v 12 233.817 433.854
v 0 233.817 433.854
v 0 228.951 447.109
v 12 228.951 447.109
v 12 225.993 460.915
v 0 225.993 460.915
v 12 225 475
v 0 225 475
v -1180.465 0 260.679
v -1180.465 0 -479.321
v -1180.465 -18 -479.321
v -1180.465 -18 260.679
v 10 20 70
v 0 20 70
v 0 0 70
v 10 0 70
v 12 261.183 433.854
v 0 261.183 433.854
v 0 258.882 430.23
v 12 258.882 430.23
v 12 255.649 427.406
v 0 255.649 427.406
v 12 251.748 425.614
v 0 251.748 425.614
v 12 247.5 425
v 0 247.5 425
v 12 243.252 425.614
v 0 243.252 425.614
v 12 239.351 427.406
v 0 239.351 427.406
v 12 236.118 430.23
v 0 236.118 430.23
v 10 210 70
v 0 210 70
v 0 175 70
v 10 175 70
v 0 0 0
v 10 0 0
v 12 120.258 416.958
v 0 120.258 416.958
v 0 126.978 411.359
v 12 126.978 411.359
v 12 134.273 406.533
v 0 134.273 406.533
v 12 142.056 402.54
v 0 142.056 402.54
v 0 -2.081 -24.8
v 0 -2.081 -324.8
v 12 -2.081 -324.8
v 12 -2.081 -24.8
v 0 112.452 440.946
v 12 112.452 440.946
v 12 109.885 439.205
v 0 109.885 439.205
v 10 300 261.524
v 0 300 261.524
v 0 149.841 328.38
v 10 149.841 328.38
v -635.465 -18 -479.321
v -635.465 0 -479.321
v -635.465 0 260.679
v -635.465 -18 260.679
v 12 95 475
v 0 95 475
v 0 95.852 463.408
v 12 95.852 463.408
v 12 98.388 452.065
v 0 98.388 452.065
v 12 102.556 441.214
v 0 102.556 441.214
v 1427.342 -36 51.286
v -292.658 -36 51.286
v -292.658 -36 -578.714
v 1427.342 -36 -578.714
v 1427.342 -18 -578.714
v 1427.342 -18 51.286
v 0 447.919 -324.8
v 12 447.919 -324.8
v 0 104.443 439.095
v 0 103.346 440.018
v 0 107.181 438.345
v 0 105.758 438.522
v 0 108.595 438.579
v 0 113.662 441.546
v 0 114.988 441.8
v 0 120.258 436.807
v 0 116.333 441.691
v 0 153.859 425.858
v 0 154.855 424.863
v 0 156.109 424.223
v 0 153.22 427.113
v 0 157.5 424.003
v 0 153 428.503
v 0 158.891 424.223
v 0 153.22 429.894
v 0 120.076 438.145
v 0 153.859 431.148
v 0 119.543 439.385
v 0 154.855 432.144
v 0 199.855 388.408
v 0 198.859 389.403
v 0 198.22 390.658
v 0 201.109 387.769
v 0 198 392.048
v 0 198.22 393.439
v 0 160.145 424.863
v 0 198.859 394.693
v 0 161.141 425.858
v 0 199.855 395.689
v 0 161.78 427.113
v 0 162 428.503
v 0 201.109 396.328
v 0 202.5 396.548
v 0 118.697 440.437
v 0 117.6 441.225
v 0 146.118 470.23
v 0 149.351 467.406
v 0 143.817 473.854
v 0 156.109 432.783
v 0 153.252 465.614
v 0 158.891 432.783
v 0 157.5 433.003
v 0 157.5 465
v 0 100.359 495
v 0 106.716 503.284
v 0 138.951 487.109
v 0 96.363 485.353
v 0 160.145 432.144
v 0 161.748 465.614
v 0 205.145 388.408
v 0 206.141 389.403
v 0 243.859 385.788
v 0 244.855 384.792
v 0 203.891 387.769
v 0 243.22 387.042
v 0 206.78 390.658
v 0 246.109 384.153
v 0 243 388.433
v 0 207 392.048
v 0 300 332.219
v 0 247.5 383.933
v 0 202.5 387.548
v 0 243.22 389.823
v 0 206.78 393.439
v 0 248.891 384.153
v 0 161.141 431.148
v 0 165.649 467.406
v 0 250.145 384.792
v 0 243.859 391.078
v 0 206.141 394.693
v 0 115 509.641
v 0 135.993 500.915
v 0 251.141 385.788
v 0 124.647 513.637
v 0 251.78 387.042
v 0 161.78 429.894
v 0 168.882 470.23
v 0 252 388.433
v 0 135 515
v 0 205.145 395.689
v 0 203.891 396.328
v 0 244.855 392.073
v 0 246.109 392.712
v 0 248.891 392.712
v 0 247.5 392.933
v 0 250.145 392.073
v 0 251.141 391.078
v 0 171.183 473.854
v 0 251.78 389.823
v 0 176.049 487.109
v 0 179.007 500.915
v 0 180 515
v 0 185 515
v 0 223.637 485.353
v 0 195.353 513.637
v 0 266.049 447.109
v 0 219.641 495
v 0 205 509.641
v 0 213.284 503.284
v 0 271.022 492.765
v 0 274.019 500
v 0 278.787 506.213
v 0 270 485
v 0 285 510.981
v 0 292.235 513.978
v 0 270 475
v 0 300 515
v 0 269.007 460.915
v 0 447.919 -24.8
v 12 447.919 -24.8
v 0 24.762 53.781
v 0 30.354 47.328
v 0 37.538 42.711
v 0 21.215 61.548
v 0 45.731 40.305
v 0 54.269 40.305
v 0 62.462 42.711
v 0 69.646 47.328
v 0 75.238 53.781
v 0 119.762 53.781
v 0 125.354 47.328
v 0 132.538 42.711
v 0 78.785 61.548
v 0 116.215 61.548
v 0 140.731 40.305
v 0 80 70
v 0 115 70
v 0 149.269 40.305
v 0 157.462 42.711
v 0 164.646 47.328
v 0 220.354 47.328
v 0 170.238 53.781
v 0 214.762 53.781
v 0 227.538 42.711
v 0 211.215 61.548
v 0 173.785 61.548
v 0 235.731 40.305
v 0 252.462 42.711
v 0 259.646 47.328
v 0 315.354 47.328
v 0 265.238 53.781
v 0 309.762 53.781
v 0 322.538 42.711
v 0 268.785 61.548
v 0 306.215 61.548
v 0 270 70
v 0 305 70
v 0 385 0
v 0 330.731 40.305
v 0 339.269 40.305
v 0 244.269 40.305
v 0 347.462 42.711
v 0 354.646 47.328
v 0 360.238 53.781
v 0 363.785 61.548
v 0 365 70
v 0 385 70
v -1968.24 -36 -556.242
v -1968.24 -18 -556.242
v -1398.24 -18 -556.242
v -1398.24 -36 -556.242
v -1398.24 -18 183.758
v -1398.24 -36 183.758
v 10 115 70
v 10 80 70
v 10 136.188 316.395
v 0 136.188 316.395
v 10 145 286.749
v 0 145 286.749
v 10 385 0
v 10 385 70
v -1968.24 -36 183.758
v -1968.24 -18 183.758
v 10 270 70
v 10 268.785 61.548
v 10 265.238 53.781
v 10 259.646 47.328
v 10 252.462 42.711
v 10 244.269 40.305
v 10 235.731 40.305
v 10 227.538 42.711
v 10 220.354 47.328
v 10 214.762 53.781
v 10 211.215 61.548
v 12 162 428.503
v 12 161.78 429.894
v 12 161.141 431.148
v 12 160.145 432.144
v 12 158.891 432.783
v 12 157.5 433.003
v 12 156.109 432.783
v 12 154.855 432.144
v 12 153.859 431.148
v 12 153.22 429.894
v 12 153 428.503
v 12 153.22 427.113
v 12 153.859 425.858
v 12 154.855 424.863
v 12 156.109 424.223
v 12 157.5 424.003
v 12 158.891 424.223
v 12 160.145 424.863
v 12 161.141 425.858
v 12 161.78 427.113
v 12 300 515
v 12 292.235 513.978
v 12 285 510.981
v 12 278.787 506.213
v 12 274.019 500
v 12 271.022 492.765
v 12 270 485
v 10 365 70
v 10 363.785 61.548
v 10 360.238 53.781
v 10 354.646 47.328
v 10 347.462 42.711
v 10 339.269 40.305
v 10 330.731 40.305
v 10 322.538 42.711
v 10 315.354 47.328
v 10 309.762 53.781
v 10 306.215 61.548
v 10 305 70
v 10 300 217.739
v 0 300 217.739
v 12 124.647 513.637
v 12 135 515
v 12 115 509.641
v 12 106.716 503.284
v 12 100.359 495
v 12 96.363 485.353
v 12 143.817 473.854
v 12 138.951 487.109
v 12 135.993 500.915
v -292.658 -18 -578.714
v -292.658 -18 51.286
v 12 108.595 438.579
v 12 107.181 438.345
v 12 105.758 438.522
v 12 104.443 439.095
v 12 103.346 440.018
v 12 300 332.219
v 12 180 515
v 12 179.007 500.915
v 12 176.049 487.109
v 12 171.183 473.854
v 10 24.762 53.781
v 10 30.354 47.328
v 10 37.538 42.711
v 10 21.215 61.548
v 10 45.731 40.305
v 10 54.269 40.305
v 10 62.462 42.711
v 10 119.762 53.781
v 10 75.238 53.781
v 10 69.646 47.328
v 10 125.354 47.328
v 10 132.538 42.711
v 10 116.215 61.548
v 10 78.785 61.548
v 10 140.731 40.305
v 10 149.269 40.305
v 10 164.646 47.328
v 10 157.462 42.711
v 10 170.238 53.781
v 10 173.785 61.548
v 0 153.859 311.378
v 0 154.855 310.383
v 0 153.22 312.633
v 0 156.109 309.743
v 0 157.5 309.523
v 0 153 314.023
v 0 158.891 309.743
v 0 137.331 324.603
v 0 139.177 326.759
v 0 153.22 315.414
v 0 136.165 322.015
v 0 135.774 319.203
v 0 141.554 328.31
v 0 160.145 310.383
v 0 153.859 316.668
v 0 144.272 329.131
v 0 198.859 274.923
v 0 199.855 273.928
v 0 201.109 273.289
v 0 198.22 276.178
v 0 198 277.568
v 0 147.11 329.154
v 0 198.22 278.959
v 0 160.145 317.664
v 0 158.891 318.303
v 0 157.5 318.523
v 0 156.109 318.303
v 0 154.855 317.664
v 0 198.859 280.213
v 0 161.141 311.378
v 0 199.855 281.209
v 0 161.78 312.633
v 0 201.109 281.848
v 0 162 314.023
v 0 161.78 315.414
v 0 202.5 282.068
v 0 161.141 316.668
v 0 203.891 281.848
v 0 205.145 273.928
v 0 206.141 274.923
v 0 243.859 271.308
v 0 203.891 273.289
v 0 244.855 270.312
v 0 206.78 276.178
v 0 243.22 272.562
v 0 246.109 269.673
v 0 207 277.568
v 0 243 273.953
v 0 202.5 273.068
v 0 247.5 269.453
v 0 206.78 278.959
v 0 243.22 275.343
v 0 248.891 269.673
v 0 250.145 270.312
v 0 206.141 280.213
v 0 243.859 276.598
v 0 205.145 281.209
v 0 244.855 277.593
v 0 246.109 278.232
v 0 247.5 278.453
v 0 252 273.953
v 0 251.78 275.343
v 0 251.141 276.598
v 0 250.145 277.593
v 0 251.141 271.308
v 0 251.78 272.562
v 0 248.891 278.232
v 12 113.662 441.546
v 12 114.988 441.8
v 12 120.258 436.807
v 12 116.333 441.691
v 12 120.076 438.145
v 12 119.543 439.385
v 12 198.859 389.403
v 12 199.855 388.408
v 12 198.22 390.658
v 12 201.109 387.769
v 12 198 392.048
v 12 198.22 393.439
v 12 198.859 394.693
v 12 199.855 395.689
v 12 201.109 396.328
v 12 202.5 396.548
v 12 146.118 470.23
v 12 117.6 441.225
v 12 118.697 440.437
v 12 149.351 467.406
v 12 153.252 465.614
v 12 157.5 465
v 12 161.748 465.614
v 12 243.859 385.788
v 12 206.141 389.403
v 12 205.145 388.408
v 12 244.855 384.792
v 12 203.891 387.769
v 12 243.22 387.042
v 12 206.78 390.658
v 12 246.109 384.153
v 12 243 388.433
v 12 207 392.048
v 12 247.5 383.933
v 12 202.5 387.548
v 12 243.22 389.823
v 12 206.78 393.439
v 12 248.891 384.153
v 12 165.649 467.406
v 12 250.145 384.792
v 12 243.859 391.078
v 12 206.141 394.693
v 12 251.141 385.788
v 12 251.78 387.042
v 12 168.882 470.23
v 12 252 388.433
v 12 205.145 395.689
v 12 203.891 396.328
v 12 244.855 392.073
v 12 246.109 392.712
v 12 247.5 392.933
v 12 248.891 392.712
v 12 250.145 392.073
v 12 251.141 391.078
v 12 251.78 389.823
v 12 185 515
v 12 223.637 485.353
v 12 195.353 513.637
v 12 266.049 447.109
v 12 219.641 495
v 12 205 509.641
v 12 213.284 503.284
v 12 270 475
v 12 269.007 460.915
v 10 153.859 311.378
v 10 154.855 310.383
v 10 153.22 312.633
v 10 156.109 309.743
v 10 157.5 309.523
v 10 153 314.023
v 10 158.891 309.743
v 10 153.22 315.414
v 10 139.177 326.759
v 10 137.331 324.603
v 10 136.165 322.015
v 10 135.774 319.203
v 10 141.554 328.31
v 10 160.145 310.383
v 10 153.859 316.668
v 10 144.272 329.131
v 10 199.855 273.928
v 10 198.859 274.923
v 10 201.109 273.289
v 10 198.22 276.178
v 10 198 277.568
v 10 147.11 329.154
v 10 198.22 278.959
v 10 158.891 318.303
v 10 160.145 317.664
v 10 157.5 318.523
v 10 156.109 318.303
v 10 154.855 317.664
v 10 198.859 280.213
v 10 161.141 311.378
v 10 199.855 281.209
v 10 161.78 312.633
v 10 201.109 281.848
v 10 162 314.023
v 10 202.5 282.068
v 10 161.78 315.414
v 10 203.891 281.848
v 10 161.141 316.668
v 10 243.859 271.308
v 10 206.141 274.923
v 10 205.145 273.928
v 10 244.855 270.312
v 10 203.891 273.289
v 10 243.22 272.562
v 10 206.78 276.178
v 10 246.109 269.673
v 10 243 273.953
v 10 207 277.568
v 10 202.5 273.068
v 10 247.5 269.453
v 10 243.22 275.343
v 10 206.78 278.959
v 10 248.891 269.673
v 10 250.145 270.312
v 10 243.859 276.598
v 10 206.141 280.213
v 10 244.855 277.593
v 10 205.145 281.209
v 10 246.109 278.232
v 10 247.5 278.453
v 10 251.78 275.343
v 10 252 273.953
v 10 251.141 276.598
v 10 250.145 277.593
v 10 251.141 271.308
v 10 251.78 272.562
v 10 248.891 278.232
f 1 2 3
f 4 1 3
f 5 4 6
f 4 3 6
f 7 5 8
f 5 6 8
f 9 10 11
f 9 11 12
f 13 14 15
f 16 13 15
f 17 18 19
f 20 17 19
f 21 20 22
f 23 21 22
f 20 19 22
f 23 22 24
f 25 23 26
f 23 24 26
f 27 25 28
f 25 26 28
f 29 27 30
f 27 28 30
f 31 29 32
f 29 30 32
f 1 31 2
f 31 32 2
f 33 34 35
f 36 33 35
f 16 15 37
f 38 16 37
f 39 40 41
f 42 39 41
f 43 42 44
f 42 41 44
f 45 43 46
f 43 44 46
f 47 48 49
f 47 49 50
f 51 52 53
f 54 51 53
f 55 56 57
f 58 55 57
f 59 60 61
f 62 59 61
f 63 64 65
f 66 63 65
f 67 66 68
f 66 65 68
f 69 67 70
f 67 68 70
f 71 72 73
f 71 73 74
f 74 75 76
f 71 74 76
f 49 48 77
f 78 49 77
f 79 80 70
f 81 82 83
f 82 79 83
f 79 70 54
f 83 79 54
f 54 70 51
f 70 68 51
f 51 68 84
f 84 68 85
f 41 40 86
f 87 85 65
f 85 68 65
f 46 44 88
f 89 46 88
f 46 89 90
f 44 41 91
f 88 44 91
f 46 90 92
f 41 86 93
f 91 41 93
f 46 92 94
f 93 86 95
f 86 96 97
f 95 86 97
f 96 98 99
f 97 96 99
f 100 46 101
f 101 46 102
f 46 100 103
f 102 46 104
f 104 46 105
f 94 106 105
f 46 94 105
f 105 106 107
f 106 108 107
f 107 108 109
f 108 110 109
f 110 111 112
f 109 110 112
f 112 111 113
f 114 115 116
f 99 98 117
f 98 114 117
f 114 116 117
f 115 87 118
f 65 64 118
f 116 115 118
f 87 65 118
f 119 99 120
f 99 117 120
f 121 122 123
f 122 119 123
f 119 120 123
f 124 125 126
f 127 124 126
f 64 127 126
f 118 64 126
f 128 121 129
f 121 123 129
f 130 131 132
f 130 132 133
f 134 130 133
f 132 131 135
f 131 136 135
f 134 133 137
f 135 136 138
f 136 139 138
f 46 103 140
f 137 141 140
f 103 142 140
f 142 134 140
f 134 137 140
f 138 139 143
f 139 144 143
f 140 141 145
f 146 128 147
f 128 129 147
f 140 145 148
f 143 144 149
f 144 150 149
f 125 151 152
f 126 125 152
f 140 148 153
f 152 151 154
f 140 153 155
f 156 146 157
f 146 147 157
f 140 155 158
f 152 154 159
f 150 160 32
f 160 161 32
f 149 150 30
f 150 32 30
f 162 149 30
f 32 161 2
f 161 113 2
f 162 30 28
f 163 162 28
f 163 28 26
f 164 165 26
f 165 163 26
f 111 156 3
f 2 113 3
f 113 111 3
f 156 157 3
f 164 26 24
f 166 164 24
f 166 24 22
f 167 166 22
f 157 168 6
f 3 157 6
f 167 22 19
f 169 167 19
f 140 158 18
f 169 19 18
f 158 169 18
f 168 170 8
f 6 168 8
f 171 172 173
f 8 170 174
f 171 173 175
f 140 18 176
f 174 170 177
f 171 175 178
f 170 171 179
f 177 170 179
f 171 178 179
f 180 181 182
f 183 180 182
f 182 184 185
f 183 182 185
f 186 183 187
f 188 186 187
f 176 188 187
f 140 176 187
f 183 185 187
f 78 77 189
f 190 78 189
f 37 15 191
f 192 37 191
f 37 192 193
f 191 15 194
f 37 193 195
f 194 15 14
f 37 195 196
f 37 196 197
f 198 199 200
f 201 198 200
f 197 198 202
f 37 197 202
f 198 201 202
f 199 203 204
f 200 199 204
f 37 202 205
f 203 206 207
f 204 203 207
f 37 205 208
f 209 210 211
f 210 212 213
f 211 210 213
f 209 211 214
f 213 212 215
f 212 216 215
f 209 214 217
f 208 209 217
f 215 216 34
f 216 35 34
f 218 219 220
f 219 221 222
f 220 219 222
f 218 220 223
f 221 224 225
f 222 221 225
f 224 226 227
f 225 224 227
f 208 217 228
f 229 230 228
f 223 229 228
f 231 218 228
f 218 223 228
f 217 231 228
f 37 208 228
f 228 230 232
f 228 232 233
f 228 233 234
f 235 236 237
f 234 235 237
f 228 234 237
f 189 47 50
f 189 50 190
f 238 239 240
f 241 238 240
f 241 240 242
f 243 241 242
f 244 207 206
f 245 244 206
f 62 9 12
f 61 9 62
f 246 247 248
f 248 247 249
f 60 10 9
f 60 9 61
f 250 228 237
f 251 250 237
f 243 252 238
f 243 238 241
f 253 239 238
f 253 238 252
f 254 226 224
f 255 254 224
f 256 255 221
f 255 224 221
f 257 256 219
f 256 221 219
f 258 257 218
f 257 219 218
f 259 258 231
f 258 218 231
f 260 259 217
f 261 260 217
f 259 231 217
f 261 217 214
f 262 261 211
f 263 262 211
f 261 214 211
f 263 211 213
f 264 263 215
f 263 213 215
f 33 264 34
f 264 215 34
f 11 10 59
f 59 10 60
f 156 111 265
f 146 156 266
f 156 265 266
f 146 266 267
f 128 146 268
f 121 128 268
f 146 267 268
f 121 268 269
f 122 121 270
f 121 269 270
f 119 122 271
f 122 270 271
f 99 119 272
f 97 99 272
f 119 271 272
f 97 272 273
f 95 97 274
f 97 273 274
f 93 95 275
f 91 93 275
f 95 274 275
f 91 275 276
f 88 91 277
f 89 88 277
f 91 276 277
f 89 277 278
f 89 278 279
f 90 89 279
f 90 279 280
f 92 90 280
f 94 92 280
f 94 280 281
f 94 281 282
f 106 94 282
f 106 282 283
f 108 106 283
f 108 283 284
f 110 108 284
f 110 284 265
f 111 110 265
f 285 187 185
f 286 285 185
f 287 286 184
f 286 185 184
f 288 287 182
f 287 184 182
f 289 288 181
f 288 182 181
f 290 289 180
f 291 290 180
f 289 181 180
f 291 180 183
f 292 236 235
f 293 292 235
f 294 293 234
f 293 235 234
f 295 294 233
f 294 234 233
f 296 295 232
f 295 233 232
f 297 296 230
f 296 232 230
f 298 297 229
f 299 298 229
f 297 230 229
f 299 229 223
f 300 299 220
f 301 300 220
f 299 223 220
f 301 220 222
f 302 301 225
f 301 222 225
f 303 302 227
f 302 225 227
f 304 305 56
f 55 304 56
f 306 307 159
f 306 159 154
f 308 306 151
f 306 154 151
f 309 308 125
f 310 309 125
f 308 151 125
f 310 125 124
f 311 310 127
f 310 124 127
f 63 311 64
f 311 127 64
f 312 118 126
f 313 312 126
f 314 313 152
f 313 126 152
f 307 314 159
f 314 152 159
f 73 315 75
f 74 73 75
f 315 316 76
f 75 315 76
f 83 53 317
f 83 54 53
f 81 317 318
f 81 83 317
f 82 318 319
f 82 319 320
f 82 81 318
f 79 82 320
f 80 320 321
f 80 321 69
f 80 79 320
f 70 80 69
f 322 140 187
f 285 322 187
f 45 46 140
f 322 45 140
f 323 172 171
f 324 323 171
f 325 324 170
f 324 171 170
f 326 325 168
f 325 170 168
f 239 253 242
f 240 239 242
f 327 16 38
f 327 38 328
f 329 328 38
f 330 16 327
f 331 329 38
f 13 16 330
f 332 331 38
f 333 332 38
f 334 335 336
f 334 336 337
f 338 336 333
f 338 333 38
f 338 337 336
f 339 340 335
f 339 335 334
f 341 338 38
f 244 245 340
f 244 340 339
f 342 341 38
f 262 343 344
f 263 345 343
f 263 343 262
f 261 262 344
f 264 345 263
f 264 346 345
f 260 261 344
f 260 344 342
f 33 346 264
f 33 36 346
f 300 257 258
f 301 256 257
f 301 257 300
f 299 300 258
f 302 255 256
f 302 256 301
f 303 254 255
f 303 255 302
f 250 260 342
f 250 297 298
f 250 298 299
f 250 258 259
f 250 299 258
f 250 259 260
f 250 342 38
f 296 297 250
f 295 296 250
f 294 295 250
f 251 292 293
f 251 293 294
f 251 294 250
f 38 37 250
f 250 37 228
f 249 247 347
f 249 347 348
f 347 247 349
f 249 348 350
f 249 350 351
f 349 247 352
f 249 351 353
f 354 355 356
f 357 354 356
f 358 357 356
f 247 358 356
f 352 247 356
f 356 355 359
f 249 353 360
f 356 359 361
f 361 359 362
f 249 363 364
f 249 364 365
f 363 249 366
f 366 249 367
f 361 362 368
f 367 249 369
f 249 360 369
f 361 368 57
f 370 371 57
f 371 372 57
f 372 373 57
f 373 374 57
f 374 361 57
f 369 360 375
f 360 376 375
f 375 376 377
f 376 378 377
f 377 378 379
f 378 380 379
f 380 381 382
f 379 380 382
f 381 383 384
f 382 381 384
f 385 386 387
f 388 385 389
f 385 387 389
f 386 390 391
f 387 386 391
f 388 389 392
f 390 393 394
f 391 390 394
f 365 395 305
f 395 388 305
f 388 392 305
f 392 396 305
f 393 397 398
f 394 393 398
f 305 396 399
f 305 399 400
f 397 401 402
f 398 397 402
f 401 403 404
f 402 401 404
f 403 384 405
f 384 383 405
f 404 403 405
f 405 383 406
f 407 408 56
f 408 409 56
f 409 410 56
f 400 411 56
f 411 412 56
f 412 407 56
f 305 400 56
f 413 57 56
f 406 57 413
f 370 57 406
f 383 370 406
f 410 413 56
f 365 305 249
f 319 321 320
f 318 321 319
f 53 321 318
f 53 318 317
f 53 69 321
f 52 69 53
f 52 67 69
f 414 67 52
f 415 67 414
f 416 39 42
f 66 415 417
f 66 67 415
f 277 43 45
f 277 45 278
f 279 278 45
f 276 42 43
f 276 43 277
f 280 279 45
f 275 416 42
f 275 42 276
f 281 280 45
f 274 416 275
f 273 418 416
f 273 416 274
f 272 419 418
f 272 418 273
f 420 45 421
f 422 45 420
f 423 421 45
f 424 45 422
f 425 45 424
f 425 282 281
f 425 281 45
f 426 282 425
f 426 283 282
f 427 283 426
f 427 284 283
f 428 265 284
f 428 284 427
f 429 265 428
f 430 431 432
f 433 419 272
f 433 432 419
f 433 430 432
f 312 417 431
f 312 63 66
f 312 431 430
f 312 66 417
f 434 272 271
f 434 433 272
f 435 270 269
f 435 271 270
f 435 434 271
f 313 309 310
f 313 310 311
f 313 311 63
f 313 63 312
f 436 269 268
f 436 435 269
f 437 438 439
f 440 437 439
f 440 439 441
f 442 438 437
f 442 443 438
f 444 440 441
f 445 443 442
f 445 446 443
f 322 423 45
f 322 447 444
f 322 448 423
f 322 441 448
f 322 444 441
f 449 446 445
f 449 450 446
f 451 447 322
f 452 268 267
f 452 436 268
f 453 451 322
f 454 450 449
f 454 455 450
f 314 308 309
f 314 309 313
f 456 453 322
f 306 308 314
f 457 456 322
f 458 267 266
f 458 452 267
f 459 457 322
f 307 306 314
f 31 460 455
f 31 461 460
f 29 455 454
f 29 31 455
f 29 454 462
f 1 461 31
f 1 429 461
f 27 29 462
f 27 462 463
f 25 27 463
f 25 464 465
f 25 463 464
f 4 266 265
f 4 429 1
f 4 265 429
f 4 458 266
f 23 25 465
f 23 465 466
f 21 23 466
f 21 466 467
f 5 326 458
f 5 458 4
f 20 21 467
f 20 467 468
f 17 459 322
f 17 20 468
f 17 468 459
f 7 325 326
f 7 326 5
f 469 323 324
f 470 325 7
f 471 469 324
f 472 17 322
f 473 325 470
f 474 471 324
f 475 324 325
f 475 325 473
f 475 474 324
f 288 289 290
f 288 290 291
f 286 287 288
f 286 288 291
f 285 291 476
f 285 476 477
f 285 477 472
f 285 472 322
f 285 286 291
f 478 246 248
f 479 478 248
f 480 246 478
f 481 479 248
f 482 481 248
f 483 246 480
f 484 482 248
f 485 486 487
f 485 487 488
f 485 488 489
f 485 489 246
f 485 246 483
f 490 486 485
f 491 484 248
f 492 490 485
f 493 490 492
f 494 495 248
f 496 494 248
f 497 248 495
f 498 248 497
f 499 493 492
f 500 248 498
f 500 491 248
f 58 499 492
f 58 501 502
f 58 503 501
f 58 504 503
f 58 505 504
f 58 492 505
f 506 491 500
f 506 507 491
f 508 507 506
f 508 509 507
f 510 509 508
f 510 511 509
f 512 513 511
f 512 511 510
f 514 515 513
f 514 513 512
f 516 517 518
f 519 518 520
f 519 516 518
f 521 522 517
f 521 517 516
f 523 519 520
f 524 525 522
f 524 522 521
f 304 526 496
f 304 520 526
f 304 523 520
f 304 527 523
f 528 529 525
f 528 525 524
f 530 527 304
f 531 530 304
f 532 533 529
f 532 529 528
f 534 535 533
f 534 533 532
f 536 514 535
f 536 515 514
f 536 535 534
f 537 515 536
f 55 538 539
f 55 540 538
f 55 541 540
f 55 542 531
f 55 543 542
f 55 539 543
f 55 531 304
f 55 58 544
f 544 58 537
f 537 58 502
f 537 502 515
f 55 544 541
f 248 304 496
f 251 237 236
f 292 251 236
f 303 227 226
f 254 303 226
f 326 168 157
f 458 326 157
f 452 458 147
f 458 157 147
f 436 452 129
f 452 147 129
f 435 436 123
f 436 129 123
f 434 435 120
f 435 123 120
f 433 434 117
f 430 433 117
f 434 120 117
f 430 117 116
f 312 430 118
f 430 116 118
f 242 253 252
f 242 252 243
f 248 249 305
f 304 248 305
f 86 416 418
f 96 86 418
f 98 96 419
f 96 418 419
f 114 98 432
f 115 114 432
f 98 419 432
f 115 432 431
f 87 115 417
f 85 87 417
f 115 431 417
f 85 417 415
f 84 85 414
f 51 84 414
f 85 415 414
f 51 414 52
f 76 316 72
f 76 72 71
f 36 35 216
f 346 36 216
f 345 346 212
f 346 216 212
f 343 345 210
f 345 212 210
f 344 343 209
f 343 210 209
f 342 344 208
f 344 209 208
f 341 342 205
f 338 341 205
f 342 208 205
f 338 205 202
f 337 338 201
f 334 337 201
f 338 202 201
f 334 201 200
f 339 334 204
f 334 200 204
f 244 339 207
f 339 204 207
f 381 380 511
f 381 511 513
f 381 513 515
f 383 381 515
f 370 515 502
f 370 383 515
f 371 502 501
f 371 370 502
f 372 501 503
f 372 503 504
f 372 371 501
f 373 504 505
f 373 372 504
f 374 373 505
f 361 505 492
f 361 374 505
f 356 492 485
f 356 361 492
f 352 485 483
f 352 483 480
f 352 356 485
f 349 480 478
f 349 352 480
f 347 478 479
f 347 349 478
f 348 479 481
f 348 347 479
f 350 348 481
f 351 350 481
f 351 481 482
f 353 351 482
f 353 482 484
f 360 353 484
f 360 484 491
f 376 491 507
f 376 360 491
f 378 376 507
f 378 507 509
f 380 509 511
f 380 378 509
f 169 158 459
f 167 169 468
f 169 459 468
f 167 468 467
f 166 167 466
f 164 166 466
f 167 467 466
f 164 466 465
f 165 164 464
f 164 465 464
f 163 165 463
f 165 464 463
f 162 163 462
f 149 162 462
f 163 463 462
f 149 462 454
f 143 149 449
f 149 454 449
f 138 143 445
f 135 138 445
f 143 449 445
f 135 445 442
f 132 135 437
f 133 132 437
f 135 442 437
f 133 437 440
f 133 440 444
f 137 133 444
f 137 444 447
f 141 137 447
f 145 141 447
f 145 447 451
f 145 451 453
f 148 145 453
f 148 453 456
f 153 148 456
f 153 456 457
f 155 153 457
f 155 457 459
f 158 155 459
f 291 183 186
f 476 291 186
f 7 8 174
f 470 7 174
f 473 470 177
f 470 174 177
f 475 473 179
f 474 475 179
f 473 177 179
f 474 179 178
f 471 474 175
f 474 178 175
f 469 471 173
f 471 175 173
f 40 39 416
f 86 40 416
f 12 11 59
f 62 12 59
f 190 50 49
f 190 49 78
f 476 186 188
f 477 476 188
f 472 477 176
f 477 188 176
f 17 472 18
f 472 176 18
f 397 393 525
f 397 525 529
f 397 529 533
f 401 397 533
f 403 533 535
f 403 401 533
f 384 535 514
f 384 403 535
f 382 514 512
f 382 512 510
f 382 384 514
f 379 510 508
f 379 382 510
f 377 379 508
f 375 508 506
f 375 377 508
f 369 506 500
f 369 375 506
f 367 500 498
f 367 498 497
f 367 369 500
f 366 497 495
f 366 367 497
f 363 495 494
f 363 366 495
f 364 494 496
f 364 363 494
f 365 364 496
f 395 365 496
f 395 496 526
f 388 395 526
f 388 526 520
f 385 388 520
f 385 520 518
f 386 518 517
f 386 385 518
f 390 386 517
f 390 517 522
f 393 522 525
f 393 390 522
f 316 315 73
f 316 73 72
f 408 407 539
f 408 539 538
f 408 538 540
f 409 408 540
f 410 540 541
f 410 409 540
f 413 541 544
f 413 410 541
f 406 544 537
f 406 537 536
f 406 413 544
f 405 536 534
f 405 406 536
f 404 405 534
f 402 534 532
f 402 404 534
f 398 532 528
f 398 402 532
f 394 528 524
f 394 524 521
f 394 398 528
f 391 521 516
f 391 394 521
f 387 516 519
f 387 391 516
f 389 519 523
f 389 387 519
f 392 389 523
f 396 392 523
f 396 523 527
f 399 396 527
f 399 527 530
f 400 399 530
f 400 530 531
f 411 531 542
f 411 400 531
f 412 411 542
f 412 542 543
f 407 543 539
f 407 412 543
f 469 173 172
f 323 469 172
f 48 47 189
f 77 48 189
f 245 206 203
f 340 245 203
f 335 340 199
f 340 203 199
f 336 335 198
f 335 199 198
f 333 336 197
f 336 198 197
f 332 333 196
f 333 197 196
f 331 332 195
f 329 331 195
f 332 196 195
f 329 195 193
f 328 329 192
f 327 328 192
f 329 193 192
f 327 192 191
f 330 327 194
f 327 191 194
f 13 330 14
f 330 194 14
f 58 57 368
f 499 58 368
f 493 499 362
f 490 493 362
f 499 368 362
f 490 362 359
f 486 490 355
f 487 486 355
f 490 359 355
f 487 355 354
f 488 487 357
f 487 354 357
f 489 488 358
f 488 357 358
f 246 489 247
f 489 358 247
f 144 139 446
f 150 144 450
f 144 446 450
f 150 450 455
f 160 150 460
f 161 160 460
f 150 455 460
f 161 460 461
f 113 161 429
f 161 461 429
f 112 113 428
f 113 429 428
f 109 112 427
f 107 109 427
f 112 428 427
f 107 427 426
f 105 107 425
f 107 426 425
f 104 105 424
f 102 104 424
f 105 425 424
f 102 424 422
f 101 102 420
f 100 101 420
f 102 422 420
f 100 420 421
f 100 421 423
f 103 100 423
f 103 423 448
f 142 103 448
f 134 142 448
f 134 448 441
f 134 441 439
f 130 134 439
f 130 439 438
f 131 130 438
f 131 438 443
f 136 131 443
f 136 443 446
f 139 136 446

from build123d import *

# Parameters (mm, degrees)
F1_DEPTH  = 10
F3_DEPTH  = 12
F4_R      = 4.5
F5_DEPTH  = 10
F6_R      = 4.5
F7_DEPTH  = 12.001
F8_W      = 545
F8_H      = 740
F9_DEPTH  = 18
F10_W     = 570
F10_H     = 740
F11_DEPTH = 18
F12_W     = 1720
F12_H     = 630
F13_DEPTH = 18
F14_W     = 450
F14_H     = 300
F15_DEPTH = 12
F17_DEPTH = 25
F18_R     = 5


with BuildPart() as f1:
    # F0 (on Right) → F1 (new body)
    with BuildSketch(Plane.YZ):
        with BuildLine():
            Line((0, 70), (0, 0))
            Line((0, 0), (385, 0))
            Line((385, 0), (385, 70))
            Line((385, 70), (365, 70))
            ThreePointArc((365, 70), (335, 40), (305, 70))
            Line((305, 70), (270, 70))
            ThreePointArc((270, 70), (240, 40), (210, 70))
            Line((210, 70), (175, 70))
            ThreePointArc((175, 70), (145, 40), (115, 70))
            Line((115, 70), (80, 70))
            ThreePointArc((80, 70), (50, 40), (20, 70))
            Line((20, 70), (0, 70))
        make_face()
    extrude(amount=F1_DEPTH)


with BuildPart() as f3:
    # F2 (on Right) → F3 (new body)
    with BuildSketch(Plane.YZ):
        with BuildLine():
            ThreePointArc((261.1829268293, 433.8536585366), (247.5, 425), (233.8170731707, 433.8536585366))
            ThreePointArc((233.8170731707, 433.8536585366), (227.2290075864, 453.9597873399), (225, 475))
            ThreePointArc((225, 475), (213.2842712475, 503.2842712475), (185, 515))
            Line((185, 515), (180, 515))
            ThreePointArc((180, 515), (177.7709924136, 493.9597873399), (171.1829268293, 473.8536585366))
            ThreePointArc((171.1829268293, 473.8536585366), (157.5, 465), (143.8170731707, 473.8536585366))
            ThreePointArc((143.8170731707, 473.8536585366), (137.2290075864, 493.9597873399), (135, 515))
            ThreePointArc((135, 515), (106.7157287525, 503.2842712475), (95, 475))
            ThreePointArc((95, 475), (107.7961867785, 431.8007974109), (142.0559440231, 402.5402004596))
            Line((142.0559440231, 402.5402004596), (300, 332.2189760647))
            Line((300, 332.2189760647), (300, 515))
            ThreePointArc((300, 515), (278.7867965644, 506.2132034356), (270, 485))
            Line((270, 485), (270, 475))
            ThreePointArc((270, 475), (267.7709924136, 453.9597873399), (261.1829268293, 433.8536585366))
        make_face()
    extrude(amount=F3_DEPTH)

    # F6 (on face) → F7 (cut, through all)
    with BuildSketch(Plane.YZ.offset(12)):
        with Locations((157.5, 428.5031508404)):
            Circle(F6_R)
        with Locations((202.5, 392.0483158239)):
            Circle(F6_R)
        with Locations((247.5, 388.4325691626)):
            Circle(F6_R)
    extrude(amount=-F7_DEPTH, mode=Mode.SUBTRACT)

    # F16 (on face) → F17 (cut)
    with BuildSketch(Plane.YZ.offset(12)):
        with BuildLine():
            Line((90.5504003167, 426.0971546173), (120.258204639, 406.9633185863))
            Line((120.258204639, 406.9633185863), (120.258204639, 416.9582954822))
            ThreePointArc((120.258204639, 416.9582954822), (112.0061980519, 425.9229716498), (105.2246160535, 436.0457764538))
            Line((105.2246160535, 436.0457764538), (90.5504003167, 426.0971546173))
        make_face()
        with BuildLine():
            ThreePointArc((105.2246160535, 436.0457764538), (112.0061980519, 425.9229716498), (120.258204639, 416.9582954822))
            Line((120.258204639, 416.9582954822), (120.258204639, 436.8074358551))
            ThreePointArc((120.258204639, 436.8074358551), (117.6003234915, 441.2249554398), (112.4524129268, 440.9459782154))
            Line((112.4524129268, 440.9459782154), (105.2246160535, 436.0457764538))
        make_face()
    extrude(amount=-F17_DEPTH, mode=Mode.SUBTRACT)

    # F18
    f18_edges = [f3.edges().sort_by_distance(p)[0] for p in [
        (6, 105.224616, 436.045776),
    ]]
    fillet(f18_edges, radius=F18_R)


with BuildPart() as f5:
    # F4 (on Right) → F5 (new body)
    with BuildSketch(Plane.YZ):
        with BuildLine():
            Line((300, 217.7390417483), (300, 261.5244928885))
            Line((300, 261.5244928885), (149.8409993356, 328.3795873416))
            ThreePointArc((149.8409993356, 328.3795873416), (139.1766209866, 326.7594127832), (136.1881253443, 316.3949144854))
            Line((136.1881253443, 316.3949144854), (145, 286.7494879711))
            Line((145, 286.7494879711), (300, 217.7390417483))
        make_face()
        with Locations((202.5, 277.5683827434)):
            Circle(F4_R, mode=Mode.SUBTRACT)
        with Locations((157.5, 314.0232177599)):
            Circle(F4_R, mode=Mode.SUBTRACT)
        with Locations((247.5, 273.9526360821)):
            Circle(F4_R, mode=Mode.SUBTRACT)
    extrude(amount=F5_DEPTH)


with BuildPart() as f9:
    # F8 (on Front) → F9 (new body)
    with BuildSketch(Plane.XZ):
        with Locations((-907.9651194595, -109.3211390078)):
            Rectangle(F8_W, F8_H)
    extrude(amount=F9_DEPTH)


with BuildPart() as f11:
    # F10 (on face) → F11 (new body)
    with BuildSketch(Plane.XZ.offset(18)):
        with Locations((-1683.239766894, -186.2418979406)):
            Rectangle(F10_W, F10_H)
    extrude(amount=F11_DEPTH)


with BuildPart() as f13:
    # F12 (on face) → F13 (new body)
    with BuildSketch(Plane.XZ.offset(18)):
        with Locations((567.3415660858, -263.714271416)):
            Rectangle(F12_W, F12_H)
    extrude(amount=F13_DEPTH)


with BuildPart() as f15:
    # F14 (on Right) → F15 (new body)
    with BuildSketch(Plane.YZ):
        with Locations((222.9189515114, -174.8001635075)):
            Rectangle(F14_W, F14_H)
    extrude(amount=F15_DEPTH)


solid = Compound([f1.part, f3.part, f5.part, f9.part, f11.part, f13.part, f15.part])
